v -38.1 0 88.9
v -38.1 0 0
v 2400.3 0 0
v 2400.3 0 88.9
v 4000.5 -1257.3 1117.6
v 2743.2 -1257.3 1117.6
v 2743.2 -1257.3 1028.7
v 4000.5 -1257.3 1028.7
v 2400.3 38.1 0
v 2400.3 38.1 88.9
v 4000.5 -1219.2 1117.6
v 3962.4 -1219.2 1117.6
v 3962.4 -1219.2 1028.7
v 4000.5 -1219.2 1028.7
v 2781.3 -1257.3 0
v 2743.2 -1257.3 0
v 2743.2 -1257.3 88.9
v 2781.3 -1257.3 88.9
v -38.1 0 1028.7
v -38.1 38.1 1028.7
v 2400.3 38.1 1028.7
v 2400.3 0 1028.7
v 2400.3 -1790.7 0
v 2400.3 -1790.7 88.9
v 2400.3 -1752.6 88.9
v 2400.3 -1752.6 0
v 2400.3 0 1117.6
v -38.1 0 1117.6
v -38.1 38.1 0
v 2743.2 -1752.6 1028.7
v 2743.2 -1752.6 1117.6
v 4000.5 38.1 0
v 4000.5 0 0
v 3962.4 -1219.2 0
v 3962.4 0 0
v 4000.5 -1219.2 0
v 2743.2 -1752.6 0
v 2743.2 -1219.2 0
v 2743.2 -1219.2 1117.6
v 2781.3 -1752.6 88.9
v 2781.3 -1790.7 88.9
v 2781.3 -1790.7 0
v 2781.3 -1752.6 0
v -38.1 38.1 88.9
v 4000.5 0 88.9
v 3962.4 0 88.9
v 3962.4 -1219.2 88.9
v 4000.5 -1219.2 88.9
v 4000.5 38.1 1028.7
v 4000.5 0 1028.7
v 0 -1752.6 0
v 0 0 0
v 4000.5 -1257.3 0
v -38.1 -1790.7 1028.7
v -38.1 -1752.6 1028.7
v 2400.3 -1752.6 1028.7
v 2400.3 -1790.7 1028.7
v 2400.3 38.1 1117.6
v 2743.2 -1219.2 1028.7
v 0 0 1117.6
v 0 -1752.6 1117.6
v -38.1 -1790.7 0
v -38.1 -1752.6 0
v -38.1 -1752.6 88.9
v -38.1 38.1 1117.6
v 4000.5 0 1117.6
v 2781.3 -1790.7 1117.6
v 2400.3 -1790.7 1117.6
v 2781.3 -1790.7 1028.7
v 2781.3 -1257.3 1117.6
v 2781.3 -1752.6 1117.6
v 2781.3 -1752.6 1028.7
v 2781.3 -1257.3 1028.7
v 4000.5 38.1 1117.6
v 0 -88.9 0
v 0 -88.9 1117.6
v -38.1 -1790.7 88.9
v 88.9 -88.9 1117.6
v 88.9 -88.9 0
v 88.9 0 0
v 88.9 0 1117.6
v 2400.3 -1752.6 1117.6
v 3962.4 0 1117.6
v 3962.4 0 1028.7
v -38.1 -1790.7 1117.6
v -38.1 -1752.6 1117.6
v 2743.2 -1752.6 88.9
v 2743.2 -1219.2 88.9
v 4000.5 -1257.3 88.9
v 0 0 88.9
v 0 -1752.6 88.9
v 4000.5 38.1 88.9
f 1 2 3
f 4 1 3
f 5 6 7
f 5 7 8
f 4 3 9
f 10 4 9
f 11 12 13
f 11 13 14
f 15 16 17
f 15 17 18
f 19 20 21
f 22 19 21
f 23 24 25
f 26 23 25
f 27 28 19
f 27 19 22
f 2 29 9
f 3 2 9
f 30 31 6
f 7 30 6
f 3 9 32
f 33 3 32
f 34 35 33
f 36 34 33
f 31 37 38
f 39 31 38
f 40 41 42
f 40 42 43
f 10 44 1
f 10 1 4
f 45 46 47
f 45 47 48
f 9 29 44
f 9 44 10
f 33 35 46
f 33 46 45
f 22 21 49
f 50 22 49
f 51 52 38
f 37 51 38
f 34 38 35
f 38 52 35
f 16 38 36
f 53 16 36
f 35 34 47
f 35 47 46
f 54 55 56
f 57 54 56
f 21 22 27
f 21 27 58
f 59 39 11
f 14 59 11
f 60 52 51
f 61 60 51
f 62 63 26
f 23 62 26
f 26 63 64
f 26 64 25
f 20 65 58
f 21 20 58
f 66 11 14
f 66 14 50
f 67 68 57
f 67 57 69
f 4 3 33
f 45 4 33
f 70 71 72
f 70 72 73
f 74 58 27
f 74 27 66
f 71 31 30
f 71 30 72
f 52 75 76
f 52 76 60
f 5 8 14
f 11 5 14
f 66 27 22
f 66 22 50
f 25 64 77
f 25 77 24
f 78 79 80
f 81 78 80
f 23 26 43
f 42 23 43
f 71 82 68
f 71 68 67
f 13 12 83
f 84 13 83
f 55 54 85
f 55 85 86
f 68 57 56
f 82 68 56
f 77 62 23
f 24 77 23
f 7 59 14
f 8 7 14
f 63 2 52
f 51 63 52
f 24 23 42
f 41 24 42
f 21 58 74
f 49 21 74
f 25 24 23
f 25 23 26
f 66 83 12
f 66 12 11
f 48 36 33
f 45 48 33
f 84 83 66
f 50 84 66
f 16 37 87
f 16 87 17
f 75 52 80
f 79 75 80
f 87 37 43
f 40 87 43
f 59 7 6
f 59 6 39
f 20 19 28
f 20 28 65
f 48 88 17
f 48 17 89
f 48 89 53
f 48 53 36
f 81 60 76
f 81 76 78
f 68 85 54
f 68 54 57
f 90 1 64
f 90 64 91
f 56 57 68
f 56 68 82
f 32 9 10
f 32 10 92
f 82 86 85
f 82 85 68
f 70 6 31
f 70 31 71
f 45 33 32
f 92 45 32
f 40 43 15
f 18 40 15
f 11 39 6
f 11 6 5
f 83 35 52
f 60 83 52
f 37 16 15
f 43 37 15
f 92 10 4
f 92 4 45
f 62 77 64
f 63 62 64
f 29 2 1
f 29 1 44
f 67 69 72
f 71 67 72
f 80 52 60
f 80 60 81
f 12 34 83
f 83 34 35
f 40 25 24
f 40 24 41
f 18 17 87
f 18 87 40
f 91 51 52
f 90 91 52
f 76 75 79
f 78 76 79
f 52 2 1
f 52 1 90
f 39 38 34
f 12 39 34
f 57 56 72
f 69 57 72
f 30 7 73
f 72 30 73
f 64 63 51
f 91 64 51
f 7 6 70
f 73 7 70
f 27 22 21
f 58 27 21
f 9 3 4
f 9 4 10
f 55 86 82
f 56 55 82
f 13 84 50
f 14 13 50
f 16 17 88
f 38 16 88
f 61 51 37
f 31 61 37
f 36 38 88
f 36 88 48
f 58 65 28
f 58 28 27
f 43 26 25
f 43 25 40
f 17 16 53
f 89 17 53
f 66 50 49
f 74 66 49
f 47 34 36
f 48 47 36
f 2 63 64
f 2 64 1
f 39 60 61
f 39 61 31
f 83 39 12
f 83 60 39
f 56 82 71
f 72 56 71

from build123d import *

# Parameters (mm, degrees)
F1_DEPTH  = 1117.6
F2_W      = 2438.4
F2_H      = 38.1
F3_DEPTH  = 88.9
F4_W      = 2438.4
F4_H      = 38.1
F5_DEPTH  = 88.9
F6_W      = 38.1
F6_H      = 1752.6
F7_DEPTH  = 88.9
F8_W      = 1600.2
F8_H      = 38.1
F9_DEPTH  = 88.9
F10_W     = 381
F10_H     = 38.1
F11_DEPTH = 88.9
F12_W     = 1257.3
F12_H     = 38.1
F13_DEPTH = 88.9
F14_W     = 38.1
F14_H     = 495.3
F15_DEPTH = 88.9
F16_W     = 38.1
F16_H     = 1219.2
F17_DEPTH = 88.9
F21_W     = 88.9
F21_H     = 88.9
F22_DEPTH = 1117.6


with BuildPart() as f1:
    # F0 (on Top) → F1 (new body)
    with BuildSketch(Plane.XY):
        Polygon((3962.4, 0), (0, 0), (0, -1752.6), (2743.2, -1752.6), (2743.2, -1219.2), (3962.4, -1219.2), align=None)
    extrude(amount=F1_DEPTH)


with BuildPart() as f3:
    # F2 (on Top) → F3 (new body)
    with BuildSketch(Plane.XY):
        with Locations((1181.1, -1771.65)):
            Rectangle(F2_W, F2_H)
    extrude(amount=F3_DEPTH)


with BuildPart() as f5:
    # F4 (on Top) → F5 (new body)
    with BuildSketch(Plane.XY):
        with Locations((1181.1, 19.05)):
            Rectangle(F4_W, F4_H)
    extrude(amount=F5_DEPTH)


with BuildPart() as f7:
    # F6 (on Top) → F7 (new body)
    with BuildSketch(Plane.XY):
        with Locations((-19.05, -876.3)):
            Rectangle(F6_W, F6_H)
    extrude(amount=F7_DEPTH)


with BuildPart() as f9:
    # F8 (on Top) → F9 (new body)
    with BuildSketch(Plane.XY):
        with Locations((3200.4, 19.05)):
            Rectangle(F8_W, F8_H)
    extrude(amount=F9_DEPTH)


with BuildPart() as f11:
    # F10 (on Top) → F11 (new body)
    with BuildSketch(Plane.XY):
        with Locations((2590.8, -1771.65)):
            Rectangle(F10_W, F10_H)
    extrude(amount=F11_DEPTH)


with BuildPart() as f13:
    # F12 (on Top) → F13 (new body)
    with BuildSketch(Plane.XY):
        with Locations((3371.85, -1238.25)):
            Rectangle(F12_W, F12_H)
    extrude(amount=F13_DEPTH)


with BuildPart() as f15:
    # F14 (on Top) → F15 (new body)
    with BuildSketch(Plane.XY):
        with Locations((2762.25, -1504.95)):
            Rectangle(F14_W, F14_H)
    extrude(amount=F15_DEPTH)


with BuildPart() as f17:
    # F16 (on Top) → F17 (new body)
    with BuildSketch(Plane.XY):
        with Locations((3981.45, -609.6)):
            Rectangle(F16_W, F16_H)
    extrude(amount=F17_DEPTH)


with BuildPart() as f19_1:
    # F19: instance of F3
    add(f3.part.mirror(Plane.XY.offset(558.8)))


with BuildPart() as f19_2:
    # F19: instance of F5
    add(f5.part.mirror(Plane.XY.offset(558.8)))


with BuildPart() as f19_3:
    # F19: instance of F7
    add(f7.part.mirror(Plane.XY.offset(558.8)))


with BuildPart() as f19_4:
    # F19: instance of F9
    add(f9.part.mirror(Plane.XY.offset(558.8)))


with BuildPart() as f19_5:
    # F19: instance of F11
    add(f11.part.mirror(Plane.XY.offset(558.8)))


with BuildPart() as f19_6:
    # F19: instance of F13
    add(f13.part.mirror(Plane.XY.offset(558.8)))


with BuildPart() as f19_7:
    # F19: instance of F15
    add(f15.part.mirror(Plane.XY.offset(558.8)))


with BuildPart() as f19_8:
    # F19: instance of F17
    add(f17.part.mirror(Plane.XY.offset(558.8)))


with BuildPart() as f22:
    # F21 (on Top) → F22 (new body)
    with BuildSketch(Plane.XY):
        with Locations((44.45, -44.45)):
            Rectangle(F21_W, F21_H)
    extrude(amount=F22_DEPTH)


solid = Compound([f1.part, f3.part, f5.part, f7.part, f9.part, f11.part, f13.part, f15.part, f17.part, f19_1.part, f19_2.part, f19_4.part, f19_5.part, f19_6.part, f19_7.part, f19_8.part, f22.part])
